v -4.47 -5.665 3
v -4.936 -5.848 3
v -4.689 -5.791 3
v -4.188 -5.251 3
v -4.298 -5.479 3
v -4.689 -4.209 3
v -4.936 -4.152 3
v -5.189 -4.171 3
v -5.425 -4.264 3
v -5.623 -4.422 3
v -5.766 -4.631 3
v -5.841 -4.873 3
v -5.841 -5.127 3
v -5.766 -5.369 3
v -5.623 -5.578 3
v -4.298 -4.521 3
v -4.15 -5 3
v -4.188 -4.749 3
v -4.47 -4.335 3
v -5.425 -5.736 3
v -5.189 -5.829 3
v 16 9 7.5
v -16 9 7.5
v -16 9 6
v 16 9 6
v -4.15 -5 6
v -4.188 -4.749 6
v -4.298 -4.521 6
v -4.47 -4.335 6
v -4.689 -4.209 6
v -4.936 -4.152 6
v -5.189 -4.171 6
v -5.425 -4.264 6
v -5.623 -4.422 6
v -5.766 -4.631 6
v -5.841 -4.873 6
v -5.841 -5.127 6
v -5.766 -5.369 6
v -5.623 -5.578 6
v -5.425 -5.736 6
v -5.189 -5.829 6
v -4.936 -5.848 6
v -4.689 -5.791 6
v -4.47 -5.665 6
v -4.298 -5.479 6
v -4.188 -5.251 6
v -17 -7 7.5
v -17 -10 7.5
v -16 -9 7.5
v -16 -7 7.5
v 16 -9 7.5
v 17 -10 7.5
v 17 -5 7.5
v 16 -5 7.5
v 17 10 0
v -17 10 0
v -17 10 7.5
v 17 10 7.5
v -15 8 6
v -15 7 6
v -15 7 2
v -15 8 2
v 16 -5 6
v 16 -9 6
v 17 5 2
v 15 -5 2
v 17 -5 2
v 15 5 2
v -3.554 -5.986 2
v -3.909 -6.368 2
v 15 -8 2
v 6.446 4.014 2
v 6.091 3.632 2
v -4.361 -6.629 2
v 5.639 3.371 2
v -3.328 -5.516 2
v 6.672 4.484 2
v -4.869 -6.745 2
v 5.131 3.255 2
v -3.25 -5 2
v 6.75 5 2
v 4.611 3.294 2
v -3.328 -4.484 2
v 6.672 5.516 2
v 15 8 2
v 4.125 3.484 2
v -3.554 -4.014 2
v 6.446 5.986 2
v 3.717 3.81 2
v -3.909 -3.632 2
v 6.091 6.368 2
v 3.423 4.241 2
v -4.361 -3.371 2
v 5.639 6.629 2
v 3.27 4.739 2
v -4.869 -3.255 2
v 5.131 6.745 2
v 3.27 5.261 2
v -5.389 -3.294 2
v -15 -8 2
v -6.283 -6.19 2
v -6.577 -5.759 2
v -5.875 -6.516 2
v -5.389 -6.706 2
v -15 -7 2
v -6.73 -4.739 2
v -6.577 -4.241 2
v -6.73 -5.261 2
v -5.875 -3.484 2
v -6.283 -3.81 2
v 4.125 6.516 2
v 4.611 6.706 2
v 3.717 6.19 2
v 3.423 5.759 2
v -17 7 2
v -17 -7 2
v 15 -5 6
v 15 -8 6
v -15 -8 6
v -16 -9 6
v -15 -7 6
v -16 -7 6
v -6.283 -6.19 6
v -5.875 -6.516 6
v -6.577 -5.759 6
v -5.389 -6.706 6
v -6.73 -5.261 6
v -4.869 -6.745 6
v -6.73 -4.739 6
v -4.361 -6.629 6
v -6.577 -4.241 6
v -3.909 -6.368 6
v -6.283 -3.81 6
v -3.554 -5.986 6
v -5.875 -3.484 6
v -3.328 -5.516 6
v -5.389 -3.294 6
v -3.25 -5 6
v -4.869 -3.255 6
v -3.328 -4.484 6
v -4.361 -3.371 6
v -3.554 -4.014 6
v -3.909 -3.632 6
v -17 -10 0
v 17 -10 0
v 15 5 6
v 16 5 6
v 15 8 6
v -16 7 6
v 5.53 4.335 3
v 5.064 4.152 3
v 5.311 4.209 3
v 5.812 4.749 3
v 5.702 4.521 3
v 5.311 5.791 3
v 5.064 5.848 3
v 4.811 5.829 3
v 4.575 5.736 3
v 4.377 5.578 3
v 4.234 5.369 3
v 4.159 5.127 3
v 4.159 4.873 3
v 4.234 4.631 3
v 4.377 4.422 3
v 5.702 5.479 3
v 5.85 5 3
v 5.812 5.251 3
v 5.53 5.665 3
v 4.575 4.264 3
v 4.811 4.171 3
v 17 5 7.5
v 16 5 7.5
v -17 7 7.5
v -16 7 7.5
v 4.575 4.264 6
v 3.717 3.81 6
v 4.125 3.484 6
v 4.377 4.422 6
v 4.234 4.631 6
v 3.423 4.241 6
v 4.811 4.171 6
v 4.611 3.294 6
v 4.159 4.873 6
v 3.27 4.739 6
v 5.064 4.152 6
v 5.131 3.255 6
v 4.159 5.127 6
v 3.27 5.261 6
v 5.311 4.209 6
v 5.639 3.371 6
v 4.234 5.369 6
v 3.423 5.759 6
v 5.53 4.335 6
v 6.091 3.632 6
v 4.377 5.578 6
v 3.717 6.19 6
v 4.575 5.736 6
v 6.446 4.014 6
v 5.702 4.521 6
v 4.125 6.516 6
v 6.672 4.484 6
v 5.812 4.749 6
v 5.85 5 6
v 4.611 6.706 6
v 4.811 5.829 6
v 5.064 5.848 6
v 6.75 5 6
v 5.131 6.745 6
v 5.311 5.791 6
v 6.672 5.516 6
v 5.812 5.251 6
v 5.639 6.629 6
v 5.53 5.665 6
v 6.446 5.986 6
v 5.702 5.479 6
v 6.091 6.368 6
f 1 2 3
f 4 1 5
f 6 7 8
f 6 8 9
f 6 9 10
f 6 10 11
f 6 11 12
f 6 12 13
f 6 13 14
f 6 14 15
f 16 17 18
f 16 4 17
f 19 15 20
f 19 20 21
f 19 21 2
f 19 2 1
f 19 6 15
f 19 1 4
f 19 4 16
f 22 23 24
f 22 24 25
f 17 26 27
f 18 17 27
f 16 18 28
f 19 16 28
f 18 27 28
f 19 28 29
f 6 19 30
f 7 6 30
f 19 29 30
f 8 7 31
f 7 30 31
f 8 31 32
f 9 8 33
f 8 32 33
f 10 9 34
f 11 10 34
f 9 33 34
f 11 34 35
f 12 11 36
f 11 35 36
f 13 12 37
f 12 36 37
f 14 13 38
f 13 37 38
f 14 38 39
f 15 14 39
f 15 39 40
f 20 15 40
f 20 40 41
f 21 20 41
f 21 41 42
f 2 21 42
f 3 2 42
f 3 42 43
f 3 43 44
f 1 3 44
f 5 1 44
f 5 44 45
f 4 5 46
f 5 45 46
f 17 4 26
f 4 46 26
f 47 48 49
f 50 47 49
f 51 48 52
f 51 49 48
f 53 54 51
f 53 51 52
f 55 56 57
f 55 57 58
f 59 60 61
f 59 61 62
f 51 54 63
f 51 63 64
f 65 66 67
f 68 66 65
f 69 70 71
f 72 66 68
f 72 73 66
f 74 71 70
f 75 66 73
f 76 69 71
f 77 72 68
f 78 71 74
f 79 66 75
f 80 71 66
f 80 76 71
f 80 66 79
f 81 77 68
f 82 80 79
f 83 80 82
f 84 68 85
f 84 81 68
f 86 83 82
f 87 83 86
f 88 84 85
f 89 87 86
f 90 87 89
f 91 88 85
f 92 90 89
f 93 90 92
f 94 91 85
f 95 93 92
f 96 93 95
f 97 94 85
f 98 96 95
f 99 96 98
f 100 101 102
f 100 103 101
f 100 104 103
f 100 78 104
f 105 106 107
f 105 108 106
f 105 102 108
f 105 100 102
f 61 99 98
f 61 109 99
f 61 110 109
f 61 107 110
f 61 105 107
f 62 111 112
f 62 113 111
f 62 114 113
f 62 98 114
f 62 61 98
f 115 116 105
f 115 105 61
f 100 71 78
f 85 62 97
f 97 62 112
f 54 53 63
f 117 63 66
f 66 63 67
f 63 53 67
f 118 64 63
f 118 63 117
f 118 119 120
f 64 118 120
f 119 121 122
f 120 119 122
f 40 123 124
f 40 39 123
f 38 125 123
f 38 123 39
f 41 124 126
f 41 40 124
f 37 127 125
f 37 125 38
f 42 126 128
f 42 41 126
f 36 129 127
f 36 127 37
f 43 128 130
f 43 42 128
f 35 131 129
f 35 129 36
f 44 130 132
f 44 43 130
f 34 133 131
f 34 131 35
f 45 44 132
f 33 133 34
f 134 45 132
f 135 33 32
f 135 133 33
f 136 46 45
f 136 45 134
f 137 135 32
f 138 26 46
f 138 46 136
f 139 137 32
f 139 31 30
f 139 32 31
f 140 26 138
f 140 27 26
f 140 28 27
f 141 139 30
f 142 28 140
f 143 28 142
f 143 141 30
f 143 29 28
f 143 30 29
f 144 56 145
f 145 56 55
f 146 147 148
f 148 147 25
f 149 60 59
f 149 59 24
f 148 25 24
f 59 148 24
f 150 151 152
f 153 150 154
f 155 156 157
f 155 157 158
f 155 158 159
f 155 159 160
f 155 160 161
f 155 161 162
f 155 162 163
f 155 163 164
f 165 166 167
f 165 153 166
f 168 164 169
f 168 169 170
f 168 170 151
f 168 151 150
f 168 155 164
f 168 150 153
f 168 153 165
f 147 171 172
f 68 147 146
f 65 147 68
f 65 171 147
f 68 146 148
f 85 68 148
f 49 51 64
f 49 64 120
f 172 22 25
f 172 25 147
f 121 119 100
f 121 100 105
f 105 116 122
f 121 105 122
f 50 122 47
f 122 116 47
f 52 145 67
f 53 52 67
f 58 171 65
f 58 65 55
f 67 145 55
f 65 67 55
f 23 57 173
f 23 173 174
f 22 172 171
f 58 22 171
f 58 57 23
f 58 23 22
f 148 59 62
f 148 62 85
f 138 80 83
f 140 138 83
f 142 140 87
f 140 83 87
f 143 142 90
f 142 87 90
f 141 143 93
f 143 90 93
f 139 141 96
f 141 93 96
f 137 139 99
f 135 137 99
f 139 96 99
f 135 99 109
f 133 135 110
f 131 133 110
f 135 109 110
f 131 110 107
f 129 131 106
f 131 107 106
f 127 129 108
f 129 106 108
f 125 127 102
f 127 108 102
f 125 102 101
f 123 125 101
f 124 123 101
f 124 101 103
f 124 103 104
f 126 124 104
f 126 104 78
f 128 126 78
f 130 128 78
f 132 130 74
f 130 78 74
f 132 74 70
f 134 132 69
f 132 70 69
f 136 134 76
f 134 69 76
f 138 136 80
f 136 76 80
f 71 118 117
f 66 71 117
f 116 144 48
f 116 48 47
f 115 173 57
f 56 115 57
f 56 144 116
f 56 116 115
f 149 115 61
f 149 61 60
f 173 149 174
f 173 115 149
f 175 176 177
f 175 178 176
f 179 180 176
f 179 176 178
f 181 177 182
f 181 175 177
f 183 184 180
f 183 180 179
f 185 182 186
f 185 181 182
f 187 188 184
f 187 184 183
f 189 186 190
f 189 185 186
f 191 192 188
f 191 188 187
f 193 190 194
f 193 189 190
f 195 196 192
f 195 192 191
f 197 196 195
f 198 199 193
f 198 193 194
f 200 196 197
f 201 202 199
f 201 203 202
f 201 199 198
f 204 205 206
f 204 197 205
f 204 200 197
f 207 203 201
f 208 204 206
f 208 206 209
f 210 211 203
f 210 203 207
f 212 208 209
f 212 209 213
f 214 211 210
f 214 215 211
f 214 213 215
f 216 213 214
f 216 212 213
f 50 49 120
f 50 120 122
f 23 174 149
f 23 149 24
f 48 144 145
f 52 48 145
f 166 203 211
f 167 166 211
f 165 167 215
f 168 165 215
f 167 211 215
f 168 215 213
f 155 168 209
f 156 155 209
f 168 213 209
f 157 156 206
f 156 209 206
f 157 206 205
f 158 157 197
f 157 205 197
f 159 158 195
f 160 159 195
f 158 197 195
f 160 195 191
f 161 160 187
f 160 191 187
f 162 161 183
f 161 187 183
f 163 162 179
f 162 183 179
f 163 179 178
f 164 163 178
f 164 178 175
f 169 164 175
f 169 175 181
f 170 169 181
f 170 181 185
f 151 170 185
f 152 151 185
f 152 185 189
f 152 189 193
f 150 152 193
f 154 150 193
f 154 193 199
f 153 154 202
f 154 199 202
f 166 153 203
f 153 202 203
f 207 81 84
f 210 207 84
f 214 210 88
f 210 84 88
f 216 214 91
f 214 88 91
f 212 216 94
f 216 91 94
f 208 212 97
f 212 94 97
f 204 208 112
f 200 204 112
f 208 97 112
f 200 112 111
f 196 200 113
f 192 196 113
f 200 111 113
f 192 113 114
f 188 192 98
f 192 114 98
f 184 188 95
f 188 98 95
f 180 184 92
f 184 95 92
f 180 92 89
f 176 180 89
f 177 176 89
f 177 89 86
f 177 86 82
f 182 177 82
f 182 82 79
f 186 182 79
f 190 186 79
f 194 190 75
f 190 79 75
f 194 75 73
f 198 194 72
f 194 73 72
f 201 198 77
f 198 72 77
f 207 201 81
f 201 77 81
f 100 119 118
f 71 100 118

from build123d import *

# Parameters (mm, degrees)
SKETCH_1_W          = 34
SKETCH_1_H          = 20
EXTRUDE_1_DEPTH     = 7.5
SKETCH_2_W          = 30
SKETCH_2_H          = 16
CUT_EXTRUDE_1_DEPTH = 5.5
SKETCH_3_W          = 5.5
SKETCH_3_H          = 10
CUT_EXTRUDE_2_DEPTH = 2
SKETCH_4_W          = 5.5
SKETCH_4_H          = 14
CUT_EXTRUDE_3_DEPTH = 2
CUT_EXTRUDE_4_DEPTH = 1.5
SKETCH_6_R          = 1.75
EXTRUDE_2_DEPTH     = 4
SKETCH_7_R          = 0.85
CUT_EXTRUDE_5_DEPTH = 3


with BuildPart() as part:
    # 草图1 → 凸台-拉伸1 (new body)
    with BuildSketch(Plane.XY):
        Rectangle(SKETCH_1_W, SKETCH_1_H)
    extrude(amount=EXTRUDE_1_DEPTH)

    # 草图2 → 切除-拉伸1 (cut)
    with BuildSketch(Plane.XY.offset(7.5)):
        Rectangle(SKETCH_2_W, SKETCH_2_H)
    extrude(amount=-CUT_EXTRUDE_1_DEPTH, mode=Mode.SUBTRACT)

    # 草图3 → 切除-拉伸2 (cut)
    with BuildSketch(Plane(origin=(17, 0, 0), x_dir=(0, 0, -1), z_dir=(1, 0, 0))):
        with Locations((-4.75, 0)):
            Rectangle(SKETCH_3_W, SKETCH_3_H)
    extrude(amount=-CUT_EXTRUDE_2_DEPTH, mode=Mode.SUBTRACT)

    # 草图4 → 切除-拉伸3 (cut)
    with BuildSketch(Plane.ZY.offset(17)):
        with Locations((4.75, 0)):
            Rectangle(SKETCH_4_W, SKETCH_4_H)
    extrude(amount=-CUT_EXTRUDE_3_DEPTH, mode=Mode.SUBTRACT)

    # 草图5 → 切除-拉伸4 (cut)
    with BuildSketch(Plane.XY.offset(7.5)):
        Polygon((-16, 7), (-16, 9), (16, 9), (16, 5), (15, 5), (15, 8), (-15, 8), (-15, 7), align=None)
        Polygon((-15, -7), (-15, -8), (15, -8), (15, -5), (16, -5), (16, -9), (-16, -9), (-16, -7), align=None)
    extrude(amount=-CUT_EXTRUDE_4_DEPTH, mode=Mode.SUBTRACT)

    # 草图6 → 凸台-拉伸2 (add)
    with BuildSketch(Plane.XY.offset(2)):
        with Locations((5, 5)):
            Circle(SKETCH_6_R)
        with Locations((-5, -5)):
            Circle(SKETCH_6_R)
    extrude(amount=EXTRUDE_2_DEPTH)

    # 草图7 → 切除-拉伸5 (cut)
    with BuildSketch(Plane.XY.offset(6)):
        with Locations((-5, -5)):
            Circle(SKETCH_7_R)
        with Locations((5, 5)):
            Circle(SKETCH_7_R)
    extrude(amount=-CUT_EXTRUDE_5_DEPTH, mode=Mode.SUBTRACT)


solid = part.part
